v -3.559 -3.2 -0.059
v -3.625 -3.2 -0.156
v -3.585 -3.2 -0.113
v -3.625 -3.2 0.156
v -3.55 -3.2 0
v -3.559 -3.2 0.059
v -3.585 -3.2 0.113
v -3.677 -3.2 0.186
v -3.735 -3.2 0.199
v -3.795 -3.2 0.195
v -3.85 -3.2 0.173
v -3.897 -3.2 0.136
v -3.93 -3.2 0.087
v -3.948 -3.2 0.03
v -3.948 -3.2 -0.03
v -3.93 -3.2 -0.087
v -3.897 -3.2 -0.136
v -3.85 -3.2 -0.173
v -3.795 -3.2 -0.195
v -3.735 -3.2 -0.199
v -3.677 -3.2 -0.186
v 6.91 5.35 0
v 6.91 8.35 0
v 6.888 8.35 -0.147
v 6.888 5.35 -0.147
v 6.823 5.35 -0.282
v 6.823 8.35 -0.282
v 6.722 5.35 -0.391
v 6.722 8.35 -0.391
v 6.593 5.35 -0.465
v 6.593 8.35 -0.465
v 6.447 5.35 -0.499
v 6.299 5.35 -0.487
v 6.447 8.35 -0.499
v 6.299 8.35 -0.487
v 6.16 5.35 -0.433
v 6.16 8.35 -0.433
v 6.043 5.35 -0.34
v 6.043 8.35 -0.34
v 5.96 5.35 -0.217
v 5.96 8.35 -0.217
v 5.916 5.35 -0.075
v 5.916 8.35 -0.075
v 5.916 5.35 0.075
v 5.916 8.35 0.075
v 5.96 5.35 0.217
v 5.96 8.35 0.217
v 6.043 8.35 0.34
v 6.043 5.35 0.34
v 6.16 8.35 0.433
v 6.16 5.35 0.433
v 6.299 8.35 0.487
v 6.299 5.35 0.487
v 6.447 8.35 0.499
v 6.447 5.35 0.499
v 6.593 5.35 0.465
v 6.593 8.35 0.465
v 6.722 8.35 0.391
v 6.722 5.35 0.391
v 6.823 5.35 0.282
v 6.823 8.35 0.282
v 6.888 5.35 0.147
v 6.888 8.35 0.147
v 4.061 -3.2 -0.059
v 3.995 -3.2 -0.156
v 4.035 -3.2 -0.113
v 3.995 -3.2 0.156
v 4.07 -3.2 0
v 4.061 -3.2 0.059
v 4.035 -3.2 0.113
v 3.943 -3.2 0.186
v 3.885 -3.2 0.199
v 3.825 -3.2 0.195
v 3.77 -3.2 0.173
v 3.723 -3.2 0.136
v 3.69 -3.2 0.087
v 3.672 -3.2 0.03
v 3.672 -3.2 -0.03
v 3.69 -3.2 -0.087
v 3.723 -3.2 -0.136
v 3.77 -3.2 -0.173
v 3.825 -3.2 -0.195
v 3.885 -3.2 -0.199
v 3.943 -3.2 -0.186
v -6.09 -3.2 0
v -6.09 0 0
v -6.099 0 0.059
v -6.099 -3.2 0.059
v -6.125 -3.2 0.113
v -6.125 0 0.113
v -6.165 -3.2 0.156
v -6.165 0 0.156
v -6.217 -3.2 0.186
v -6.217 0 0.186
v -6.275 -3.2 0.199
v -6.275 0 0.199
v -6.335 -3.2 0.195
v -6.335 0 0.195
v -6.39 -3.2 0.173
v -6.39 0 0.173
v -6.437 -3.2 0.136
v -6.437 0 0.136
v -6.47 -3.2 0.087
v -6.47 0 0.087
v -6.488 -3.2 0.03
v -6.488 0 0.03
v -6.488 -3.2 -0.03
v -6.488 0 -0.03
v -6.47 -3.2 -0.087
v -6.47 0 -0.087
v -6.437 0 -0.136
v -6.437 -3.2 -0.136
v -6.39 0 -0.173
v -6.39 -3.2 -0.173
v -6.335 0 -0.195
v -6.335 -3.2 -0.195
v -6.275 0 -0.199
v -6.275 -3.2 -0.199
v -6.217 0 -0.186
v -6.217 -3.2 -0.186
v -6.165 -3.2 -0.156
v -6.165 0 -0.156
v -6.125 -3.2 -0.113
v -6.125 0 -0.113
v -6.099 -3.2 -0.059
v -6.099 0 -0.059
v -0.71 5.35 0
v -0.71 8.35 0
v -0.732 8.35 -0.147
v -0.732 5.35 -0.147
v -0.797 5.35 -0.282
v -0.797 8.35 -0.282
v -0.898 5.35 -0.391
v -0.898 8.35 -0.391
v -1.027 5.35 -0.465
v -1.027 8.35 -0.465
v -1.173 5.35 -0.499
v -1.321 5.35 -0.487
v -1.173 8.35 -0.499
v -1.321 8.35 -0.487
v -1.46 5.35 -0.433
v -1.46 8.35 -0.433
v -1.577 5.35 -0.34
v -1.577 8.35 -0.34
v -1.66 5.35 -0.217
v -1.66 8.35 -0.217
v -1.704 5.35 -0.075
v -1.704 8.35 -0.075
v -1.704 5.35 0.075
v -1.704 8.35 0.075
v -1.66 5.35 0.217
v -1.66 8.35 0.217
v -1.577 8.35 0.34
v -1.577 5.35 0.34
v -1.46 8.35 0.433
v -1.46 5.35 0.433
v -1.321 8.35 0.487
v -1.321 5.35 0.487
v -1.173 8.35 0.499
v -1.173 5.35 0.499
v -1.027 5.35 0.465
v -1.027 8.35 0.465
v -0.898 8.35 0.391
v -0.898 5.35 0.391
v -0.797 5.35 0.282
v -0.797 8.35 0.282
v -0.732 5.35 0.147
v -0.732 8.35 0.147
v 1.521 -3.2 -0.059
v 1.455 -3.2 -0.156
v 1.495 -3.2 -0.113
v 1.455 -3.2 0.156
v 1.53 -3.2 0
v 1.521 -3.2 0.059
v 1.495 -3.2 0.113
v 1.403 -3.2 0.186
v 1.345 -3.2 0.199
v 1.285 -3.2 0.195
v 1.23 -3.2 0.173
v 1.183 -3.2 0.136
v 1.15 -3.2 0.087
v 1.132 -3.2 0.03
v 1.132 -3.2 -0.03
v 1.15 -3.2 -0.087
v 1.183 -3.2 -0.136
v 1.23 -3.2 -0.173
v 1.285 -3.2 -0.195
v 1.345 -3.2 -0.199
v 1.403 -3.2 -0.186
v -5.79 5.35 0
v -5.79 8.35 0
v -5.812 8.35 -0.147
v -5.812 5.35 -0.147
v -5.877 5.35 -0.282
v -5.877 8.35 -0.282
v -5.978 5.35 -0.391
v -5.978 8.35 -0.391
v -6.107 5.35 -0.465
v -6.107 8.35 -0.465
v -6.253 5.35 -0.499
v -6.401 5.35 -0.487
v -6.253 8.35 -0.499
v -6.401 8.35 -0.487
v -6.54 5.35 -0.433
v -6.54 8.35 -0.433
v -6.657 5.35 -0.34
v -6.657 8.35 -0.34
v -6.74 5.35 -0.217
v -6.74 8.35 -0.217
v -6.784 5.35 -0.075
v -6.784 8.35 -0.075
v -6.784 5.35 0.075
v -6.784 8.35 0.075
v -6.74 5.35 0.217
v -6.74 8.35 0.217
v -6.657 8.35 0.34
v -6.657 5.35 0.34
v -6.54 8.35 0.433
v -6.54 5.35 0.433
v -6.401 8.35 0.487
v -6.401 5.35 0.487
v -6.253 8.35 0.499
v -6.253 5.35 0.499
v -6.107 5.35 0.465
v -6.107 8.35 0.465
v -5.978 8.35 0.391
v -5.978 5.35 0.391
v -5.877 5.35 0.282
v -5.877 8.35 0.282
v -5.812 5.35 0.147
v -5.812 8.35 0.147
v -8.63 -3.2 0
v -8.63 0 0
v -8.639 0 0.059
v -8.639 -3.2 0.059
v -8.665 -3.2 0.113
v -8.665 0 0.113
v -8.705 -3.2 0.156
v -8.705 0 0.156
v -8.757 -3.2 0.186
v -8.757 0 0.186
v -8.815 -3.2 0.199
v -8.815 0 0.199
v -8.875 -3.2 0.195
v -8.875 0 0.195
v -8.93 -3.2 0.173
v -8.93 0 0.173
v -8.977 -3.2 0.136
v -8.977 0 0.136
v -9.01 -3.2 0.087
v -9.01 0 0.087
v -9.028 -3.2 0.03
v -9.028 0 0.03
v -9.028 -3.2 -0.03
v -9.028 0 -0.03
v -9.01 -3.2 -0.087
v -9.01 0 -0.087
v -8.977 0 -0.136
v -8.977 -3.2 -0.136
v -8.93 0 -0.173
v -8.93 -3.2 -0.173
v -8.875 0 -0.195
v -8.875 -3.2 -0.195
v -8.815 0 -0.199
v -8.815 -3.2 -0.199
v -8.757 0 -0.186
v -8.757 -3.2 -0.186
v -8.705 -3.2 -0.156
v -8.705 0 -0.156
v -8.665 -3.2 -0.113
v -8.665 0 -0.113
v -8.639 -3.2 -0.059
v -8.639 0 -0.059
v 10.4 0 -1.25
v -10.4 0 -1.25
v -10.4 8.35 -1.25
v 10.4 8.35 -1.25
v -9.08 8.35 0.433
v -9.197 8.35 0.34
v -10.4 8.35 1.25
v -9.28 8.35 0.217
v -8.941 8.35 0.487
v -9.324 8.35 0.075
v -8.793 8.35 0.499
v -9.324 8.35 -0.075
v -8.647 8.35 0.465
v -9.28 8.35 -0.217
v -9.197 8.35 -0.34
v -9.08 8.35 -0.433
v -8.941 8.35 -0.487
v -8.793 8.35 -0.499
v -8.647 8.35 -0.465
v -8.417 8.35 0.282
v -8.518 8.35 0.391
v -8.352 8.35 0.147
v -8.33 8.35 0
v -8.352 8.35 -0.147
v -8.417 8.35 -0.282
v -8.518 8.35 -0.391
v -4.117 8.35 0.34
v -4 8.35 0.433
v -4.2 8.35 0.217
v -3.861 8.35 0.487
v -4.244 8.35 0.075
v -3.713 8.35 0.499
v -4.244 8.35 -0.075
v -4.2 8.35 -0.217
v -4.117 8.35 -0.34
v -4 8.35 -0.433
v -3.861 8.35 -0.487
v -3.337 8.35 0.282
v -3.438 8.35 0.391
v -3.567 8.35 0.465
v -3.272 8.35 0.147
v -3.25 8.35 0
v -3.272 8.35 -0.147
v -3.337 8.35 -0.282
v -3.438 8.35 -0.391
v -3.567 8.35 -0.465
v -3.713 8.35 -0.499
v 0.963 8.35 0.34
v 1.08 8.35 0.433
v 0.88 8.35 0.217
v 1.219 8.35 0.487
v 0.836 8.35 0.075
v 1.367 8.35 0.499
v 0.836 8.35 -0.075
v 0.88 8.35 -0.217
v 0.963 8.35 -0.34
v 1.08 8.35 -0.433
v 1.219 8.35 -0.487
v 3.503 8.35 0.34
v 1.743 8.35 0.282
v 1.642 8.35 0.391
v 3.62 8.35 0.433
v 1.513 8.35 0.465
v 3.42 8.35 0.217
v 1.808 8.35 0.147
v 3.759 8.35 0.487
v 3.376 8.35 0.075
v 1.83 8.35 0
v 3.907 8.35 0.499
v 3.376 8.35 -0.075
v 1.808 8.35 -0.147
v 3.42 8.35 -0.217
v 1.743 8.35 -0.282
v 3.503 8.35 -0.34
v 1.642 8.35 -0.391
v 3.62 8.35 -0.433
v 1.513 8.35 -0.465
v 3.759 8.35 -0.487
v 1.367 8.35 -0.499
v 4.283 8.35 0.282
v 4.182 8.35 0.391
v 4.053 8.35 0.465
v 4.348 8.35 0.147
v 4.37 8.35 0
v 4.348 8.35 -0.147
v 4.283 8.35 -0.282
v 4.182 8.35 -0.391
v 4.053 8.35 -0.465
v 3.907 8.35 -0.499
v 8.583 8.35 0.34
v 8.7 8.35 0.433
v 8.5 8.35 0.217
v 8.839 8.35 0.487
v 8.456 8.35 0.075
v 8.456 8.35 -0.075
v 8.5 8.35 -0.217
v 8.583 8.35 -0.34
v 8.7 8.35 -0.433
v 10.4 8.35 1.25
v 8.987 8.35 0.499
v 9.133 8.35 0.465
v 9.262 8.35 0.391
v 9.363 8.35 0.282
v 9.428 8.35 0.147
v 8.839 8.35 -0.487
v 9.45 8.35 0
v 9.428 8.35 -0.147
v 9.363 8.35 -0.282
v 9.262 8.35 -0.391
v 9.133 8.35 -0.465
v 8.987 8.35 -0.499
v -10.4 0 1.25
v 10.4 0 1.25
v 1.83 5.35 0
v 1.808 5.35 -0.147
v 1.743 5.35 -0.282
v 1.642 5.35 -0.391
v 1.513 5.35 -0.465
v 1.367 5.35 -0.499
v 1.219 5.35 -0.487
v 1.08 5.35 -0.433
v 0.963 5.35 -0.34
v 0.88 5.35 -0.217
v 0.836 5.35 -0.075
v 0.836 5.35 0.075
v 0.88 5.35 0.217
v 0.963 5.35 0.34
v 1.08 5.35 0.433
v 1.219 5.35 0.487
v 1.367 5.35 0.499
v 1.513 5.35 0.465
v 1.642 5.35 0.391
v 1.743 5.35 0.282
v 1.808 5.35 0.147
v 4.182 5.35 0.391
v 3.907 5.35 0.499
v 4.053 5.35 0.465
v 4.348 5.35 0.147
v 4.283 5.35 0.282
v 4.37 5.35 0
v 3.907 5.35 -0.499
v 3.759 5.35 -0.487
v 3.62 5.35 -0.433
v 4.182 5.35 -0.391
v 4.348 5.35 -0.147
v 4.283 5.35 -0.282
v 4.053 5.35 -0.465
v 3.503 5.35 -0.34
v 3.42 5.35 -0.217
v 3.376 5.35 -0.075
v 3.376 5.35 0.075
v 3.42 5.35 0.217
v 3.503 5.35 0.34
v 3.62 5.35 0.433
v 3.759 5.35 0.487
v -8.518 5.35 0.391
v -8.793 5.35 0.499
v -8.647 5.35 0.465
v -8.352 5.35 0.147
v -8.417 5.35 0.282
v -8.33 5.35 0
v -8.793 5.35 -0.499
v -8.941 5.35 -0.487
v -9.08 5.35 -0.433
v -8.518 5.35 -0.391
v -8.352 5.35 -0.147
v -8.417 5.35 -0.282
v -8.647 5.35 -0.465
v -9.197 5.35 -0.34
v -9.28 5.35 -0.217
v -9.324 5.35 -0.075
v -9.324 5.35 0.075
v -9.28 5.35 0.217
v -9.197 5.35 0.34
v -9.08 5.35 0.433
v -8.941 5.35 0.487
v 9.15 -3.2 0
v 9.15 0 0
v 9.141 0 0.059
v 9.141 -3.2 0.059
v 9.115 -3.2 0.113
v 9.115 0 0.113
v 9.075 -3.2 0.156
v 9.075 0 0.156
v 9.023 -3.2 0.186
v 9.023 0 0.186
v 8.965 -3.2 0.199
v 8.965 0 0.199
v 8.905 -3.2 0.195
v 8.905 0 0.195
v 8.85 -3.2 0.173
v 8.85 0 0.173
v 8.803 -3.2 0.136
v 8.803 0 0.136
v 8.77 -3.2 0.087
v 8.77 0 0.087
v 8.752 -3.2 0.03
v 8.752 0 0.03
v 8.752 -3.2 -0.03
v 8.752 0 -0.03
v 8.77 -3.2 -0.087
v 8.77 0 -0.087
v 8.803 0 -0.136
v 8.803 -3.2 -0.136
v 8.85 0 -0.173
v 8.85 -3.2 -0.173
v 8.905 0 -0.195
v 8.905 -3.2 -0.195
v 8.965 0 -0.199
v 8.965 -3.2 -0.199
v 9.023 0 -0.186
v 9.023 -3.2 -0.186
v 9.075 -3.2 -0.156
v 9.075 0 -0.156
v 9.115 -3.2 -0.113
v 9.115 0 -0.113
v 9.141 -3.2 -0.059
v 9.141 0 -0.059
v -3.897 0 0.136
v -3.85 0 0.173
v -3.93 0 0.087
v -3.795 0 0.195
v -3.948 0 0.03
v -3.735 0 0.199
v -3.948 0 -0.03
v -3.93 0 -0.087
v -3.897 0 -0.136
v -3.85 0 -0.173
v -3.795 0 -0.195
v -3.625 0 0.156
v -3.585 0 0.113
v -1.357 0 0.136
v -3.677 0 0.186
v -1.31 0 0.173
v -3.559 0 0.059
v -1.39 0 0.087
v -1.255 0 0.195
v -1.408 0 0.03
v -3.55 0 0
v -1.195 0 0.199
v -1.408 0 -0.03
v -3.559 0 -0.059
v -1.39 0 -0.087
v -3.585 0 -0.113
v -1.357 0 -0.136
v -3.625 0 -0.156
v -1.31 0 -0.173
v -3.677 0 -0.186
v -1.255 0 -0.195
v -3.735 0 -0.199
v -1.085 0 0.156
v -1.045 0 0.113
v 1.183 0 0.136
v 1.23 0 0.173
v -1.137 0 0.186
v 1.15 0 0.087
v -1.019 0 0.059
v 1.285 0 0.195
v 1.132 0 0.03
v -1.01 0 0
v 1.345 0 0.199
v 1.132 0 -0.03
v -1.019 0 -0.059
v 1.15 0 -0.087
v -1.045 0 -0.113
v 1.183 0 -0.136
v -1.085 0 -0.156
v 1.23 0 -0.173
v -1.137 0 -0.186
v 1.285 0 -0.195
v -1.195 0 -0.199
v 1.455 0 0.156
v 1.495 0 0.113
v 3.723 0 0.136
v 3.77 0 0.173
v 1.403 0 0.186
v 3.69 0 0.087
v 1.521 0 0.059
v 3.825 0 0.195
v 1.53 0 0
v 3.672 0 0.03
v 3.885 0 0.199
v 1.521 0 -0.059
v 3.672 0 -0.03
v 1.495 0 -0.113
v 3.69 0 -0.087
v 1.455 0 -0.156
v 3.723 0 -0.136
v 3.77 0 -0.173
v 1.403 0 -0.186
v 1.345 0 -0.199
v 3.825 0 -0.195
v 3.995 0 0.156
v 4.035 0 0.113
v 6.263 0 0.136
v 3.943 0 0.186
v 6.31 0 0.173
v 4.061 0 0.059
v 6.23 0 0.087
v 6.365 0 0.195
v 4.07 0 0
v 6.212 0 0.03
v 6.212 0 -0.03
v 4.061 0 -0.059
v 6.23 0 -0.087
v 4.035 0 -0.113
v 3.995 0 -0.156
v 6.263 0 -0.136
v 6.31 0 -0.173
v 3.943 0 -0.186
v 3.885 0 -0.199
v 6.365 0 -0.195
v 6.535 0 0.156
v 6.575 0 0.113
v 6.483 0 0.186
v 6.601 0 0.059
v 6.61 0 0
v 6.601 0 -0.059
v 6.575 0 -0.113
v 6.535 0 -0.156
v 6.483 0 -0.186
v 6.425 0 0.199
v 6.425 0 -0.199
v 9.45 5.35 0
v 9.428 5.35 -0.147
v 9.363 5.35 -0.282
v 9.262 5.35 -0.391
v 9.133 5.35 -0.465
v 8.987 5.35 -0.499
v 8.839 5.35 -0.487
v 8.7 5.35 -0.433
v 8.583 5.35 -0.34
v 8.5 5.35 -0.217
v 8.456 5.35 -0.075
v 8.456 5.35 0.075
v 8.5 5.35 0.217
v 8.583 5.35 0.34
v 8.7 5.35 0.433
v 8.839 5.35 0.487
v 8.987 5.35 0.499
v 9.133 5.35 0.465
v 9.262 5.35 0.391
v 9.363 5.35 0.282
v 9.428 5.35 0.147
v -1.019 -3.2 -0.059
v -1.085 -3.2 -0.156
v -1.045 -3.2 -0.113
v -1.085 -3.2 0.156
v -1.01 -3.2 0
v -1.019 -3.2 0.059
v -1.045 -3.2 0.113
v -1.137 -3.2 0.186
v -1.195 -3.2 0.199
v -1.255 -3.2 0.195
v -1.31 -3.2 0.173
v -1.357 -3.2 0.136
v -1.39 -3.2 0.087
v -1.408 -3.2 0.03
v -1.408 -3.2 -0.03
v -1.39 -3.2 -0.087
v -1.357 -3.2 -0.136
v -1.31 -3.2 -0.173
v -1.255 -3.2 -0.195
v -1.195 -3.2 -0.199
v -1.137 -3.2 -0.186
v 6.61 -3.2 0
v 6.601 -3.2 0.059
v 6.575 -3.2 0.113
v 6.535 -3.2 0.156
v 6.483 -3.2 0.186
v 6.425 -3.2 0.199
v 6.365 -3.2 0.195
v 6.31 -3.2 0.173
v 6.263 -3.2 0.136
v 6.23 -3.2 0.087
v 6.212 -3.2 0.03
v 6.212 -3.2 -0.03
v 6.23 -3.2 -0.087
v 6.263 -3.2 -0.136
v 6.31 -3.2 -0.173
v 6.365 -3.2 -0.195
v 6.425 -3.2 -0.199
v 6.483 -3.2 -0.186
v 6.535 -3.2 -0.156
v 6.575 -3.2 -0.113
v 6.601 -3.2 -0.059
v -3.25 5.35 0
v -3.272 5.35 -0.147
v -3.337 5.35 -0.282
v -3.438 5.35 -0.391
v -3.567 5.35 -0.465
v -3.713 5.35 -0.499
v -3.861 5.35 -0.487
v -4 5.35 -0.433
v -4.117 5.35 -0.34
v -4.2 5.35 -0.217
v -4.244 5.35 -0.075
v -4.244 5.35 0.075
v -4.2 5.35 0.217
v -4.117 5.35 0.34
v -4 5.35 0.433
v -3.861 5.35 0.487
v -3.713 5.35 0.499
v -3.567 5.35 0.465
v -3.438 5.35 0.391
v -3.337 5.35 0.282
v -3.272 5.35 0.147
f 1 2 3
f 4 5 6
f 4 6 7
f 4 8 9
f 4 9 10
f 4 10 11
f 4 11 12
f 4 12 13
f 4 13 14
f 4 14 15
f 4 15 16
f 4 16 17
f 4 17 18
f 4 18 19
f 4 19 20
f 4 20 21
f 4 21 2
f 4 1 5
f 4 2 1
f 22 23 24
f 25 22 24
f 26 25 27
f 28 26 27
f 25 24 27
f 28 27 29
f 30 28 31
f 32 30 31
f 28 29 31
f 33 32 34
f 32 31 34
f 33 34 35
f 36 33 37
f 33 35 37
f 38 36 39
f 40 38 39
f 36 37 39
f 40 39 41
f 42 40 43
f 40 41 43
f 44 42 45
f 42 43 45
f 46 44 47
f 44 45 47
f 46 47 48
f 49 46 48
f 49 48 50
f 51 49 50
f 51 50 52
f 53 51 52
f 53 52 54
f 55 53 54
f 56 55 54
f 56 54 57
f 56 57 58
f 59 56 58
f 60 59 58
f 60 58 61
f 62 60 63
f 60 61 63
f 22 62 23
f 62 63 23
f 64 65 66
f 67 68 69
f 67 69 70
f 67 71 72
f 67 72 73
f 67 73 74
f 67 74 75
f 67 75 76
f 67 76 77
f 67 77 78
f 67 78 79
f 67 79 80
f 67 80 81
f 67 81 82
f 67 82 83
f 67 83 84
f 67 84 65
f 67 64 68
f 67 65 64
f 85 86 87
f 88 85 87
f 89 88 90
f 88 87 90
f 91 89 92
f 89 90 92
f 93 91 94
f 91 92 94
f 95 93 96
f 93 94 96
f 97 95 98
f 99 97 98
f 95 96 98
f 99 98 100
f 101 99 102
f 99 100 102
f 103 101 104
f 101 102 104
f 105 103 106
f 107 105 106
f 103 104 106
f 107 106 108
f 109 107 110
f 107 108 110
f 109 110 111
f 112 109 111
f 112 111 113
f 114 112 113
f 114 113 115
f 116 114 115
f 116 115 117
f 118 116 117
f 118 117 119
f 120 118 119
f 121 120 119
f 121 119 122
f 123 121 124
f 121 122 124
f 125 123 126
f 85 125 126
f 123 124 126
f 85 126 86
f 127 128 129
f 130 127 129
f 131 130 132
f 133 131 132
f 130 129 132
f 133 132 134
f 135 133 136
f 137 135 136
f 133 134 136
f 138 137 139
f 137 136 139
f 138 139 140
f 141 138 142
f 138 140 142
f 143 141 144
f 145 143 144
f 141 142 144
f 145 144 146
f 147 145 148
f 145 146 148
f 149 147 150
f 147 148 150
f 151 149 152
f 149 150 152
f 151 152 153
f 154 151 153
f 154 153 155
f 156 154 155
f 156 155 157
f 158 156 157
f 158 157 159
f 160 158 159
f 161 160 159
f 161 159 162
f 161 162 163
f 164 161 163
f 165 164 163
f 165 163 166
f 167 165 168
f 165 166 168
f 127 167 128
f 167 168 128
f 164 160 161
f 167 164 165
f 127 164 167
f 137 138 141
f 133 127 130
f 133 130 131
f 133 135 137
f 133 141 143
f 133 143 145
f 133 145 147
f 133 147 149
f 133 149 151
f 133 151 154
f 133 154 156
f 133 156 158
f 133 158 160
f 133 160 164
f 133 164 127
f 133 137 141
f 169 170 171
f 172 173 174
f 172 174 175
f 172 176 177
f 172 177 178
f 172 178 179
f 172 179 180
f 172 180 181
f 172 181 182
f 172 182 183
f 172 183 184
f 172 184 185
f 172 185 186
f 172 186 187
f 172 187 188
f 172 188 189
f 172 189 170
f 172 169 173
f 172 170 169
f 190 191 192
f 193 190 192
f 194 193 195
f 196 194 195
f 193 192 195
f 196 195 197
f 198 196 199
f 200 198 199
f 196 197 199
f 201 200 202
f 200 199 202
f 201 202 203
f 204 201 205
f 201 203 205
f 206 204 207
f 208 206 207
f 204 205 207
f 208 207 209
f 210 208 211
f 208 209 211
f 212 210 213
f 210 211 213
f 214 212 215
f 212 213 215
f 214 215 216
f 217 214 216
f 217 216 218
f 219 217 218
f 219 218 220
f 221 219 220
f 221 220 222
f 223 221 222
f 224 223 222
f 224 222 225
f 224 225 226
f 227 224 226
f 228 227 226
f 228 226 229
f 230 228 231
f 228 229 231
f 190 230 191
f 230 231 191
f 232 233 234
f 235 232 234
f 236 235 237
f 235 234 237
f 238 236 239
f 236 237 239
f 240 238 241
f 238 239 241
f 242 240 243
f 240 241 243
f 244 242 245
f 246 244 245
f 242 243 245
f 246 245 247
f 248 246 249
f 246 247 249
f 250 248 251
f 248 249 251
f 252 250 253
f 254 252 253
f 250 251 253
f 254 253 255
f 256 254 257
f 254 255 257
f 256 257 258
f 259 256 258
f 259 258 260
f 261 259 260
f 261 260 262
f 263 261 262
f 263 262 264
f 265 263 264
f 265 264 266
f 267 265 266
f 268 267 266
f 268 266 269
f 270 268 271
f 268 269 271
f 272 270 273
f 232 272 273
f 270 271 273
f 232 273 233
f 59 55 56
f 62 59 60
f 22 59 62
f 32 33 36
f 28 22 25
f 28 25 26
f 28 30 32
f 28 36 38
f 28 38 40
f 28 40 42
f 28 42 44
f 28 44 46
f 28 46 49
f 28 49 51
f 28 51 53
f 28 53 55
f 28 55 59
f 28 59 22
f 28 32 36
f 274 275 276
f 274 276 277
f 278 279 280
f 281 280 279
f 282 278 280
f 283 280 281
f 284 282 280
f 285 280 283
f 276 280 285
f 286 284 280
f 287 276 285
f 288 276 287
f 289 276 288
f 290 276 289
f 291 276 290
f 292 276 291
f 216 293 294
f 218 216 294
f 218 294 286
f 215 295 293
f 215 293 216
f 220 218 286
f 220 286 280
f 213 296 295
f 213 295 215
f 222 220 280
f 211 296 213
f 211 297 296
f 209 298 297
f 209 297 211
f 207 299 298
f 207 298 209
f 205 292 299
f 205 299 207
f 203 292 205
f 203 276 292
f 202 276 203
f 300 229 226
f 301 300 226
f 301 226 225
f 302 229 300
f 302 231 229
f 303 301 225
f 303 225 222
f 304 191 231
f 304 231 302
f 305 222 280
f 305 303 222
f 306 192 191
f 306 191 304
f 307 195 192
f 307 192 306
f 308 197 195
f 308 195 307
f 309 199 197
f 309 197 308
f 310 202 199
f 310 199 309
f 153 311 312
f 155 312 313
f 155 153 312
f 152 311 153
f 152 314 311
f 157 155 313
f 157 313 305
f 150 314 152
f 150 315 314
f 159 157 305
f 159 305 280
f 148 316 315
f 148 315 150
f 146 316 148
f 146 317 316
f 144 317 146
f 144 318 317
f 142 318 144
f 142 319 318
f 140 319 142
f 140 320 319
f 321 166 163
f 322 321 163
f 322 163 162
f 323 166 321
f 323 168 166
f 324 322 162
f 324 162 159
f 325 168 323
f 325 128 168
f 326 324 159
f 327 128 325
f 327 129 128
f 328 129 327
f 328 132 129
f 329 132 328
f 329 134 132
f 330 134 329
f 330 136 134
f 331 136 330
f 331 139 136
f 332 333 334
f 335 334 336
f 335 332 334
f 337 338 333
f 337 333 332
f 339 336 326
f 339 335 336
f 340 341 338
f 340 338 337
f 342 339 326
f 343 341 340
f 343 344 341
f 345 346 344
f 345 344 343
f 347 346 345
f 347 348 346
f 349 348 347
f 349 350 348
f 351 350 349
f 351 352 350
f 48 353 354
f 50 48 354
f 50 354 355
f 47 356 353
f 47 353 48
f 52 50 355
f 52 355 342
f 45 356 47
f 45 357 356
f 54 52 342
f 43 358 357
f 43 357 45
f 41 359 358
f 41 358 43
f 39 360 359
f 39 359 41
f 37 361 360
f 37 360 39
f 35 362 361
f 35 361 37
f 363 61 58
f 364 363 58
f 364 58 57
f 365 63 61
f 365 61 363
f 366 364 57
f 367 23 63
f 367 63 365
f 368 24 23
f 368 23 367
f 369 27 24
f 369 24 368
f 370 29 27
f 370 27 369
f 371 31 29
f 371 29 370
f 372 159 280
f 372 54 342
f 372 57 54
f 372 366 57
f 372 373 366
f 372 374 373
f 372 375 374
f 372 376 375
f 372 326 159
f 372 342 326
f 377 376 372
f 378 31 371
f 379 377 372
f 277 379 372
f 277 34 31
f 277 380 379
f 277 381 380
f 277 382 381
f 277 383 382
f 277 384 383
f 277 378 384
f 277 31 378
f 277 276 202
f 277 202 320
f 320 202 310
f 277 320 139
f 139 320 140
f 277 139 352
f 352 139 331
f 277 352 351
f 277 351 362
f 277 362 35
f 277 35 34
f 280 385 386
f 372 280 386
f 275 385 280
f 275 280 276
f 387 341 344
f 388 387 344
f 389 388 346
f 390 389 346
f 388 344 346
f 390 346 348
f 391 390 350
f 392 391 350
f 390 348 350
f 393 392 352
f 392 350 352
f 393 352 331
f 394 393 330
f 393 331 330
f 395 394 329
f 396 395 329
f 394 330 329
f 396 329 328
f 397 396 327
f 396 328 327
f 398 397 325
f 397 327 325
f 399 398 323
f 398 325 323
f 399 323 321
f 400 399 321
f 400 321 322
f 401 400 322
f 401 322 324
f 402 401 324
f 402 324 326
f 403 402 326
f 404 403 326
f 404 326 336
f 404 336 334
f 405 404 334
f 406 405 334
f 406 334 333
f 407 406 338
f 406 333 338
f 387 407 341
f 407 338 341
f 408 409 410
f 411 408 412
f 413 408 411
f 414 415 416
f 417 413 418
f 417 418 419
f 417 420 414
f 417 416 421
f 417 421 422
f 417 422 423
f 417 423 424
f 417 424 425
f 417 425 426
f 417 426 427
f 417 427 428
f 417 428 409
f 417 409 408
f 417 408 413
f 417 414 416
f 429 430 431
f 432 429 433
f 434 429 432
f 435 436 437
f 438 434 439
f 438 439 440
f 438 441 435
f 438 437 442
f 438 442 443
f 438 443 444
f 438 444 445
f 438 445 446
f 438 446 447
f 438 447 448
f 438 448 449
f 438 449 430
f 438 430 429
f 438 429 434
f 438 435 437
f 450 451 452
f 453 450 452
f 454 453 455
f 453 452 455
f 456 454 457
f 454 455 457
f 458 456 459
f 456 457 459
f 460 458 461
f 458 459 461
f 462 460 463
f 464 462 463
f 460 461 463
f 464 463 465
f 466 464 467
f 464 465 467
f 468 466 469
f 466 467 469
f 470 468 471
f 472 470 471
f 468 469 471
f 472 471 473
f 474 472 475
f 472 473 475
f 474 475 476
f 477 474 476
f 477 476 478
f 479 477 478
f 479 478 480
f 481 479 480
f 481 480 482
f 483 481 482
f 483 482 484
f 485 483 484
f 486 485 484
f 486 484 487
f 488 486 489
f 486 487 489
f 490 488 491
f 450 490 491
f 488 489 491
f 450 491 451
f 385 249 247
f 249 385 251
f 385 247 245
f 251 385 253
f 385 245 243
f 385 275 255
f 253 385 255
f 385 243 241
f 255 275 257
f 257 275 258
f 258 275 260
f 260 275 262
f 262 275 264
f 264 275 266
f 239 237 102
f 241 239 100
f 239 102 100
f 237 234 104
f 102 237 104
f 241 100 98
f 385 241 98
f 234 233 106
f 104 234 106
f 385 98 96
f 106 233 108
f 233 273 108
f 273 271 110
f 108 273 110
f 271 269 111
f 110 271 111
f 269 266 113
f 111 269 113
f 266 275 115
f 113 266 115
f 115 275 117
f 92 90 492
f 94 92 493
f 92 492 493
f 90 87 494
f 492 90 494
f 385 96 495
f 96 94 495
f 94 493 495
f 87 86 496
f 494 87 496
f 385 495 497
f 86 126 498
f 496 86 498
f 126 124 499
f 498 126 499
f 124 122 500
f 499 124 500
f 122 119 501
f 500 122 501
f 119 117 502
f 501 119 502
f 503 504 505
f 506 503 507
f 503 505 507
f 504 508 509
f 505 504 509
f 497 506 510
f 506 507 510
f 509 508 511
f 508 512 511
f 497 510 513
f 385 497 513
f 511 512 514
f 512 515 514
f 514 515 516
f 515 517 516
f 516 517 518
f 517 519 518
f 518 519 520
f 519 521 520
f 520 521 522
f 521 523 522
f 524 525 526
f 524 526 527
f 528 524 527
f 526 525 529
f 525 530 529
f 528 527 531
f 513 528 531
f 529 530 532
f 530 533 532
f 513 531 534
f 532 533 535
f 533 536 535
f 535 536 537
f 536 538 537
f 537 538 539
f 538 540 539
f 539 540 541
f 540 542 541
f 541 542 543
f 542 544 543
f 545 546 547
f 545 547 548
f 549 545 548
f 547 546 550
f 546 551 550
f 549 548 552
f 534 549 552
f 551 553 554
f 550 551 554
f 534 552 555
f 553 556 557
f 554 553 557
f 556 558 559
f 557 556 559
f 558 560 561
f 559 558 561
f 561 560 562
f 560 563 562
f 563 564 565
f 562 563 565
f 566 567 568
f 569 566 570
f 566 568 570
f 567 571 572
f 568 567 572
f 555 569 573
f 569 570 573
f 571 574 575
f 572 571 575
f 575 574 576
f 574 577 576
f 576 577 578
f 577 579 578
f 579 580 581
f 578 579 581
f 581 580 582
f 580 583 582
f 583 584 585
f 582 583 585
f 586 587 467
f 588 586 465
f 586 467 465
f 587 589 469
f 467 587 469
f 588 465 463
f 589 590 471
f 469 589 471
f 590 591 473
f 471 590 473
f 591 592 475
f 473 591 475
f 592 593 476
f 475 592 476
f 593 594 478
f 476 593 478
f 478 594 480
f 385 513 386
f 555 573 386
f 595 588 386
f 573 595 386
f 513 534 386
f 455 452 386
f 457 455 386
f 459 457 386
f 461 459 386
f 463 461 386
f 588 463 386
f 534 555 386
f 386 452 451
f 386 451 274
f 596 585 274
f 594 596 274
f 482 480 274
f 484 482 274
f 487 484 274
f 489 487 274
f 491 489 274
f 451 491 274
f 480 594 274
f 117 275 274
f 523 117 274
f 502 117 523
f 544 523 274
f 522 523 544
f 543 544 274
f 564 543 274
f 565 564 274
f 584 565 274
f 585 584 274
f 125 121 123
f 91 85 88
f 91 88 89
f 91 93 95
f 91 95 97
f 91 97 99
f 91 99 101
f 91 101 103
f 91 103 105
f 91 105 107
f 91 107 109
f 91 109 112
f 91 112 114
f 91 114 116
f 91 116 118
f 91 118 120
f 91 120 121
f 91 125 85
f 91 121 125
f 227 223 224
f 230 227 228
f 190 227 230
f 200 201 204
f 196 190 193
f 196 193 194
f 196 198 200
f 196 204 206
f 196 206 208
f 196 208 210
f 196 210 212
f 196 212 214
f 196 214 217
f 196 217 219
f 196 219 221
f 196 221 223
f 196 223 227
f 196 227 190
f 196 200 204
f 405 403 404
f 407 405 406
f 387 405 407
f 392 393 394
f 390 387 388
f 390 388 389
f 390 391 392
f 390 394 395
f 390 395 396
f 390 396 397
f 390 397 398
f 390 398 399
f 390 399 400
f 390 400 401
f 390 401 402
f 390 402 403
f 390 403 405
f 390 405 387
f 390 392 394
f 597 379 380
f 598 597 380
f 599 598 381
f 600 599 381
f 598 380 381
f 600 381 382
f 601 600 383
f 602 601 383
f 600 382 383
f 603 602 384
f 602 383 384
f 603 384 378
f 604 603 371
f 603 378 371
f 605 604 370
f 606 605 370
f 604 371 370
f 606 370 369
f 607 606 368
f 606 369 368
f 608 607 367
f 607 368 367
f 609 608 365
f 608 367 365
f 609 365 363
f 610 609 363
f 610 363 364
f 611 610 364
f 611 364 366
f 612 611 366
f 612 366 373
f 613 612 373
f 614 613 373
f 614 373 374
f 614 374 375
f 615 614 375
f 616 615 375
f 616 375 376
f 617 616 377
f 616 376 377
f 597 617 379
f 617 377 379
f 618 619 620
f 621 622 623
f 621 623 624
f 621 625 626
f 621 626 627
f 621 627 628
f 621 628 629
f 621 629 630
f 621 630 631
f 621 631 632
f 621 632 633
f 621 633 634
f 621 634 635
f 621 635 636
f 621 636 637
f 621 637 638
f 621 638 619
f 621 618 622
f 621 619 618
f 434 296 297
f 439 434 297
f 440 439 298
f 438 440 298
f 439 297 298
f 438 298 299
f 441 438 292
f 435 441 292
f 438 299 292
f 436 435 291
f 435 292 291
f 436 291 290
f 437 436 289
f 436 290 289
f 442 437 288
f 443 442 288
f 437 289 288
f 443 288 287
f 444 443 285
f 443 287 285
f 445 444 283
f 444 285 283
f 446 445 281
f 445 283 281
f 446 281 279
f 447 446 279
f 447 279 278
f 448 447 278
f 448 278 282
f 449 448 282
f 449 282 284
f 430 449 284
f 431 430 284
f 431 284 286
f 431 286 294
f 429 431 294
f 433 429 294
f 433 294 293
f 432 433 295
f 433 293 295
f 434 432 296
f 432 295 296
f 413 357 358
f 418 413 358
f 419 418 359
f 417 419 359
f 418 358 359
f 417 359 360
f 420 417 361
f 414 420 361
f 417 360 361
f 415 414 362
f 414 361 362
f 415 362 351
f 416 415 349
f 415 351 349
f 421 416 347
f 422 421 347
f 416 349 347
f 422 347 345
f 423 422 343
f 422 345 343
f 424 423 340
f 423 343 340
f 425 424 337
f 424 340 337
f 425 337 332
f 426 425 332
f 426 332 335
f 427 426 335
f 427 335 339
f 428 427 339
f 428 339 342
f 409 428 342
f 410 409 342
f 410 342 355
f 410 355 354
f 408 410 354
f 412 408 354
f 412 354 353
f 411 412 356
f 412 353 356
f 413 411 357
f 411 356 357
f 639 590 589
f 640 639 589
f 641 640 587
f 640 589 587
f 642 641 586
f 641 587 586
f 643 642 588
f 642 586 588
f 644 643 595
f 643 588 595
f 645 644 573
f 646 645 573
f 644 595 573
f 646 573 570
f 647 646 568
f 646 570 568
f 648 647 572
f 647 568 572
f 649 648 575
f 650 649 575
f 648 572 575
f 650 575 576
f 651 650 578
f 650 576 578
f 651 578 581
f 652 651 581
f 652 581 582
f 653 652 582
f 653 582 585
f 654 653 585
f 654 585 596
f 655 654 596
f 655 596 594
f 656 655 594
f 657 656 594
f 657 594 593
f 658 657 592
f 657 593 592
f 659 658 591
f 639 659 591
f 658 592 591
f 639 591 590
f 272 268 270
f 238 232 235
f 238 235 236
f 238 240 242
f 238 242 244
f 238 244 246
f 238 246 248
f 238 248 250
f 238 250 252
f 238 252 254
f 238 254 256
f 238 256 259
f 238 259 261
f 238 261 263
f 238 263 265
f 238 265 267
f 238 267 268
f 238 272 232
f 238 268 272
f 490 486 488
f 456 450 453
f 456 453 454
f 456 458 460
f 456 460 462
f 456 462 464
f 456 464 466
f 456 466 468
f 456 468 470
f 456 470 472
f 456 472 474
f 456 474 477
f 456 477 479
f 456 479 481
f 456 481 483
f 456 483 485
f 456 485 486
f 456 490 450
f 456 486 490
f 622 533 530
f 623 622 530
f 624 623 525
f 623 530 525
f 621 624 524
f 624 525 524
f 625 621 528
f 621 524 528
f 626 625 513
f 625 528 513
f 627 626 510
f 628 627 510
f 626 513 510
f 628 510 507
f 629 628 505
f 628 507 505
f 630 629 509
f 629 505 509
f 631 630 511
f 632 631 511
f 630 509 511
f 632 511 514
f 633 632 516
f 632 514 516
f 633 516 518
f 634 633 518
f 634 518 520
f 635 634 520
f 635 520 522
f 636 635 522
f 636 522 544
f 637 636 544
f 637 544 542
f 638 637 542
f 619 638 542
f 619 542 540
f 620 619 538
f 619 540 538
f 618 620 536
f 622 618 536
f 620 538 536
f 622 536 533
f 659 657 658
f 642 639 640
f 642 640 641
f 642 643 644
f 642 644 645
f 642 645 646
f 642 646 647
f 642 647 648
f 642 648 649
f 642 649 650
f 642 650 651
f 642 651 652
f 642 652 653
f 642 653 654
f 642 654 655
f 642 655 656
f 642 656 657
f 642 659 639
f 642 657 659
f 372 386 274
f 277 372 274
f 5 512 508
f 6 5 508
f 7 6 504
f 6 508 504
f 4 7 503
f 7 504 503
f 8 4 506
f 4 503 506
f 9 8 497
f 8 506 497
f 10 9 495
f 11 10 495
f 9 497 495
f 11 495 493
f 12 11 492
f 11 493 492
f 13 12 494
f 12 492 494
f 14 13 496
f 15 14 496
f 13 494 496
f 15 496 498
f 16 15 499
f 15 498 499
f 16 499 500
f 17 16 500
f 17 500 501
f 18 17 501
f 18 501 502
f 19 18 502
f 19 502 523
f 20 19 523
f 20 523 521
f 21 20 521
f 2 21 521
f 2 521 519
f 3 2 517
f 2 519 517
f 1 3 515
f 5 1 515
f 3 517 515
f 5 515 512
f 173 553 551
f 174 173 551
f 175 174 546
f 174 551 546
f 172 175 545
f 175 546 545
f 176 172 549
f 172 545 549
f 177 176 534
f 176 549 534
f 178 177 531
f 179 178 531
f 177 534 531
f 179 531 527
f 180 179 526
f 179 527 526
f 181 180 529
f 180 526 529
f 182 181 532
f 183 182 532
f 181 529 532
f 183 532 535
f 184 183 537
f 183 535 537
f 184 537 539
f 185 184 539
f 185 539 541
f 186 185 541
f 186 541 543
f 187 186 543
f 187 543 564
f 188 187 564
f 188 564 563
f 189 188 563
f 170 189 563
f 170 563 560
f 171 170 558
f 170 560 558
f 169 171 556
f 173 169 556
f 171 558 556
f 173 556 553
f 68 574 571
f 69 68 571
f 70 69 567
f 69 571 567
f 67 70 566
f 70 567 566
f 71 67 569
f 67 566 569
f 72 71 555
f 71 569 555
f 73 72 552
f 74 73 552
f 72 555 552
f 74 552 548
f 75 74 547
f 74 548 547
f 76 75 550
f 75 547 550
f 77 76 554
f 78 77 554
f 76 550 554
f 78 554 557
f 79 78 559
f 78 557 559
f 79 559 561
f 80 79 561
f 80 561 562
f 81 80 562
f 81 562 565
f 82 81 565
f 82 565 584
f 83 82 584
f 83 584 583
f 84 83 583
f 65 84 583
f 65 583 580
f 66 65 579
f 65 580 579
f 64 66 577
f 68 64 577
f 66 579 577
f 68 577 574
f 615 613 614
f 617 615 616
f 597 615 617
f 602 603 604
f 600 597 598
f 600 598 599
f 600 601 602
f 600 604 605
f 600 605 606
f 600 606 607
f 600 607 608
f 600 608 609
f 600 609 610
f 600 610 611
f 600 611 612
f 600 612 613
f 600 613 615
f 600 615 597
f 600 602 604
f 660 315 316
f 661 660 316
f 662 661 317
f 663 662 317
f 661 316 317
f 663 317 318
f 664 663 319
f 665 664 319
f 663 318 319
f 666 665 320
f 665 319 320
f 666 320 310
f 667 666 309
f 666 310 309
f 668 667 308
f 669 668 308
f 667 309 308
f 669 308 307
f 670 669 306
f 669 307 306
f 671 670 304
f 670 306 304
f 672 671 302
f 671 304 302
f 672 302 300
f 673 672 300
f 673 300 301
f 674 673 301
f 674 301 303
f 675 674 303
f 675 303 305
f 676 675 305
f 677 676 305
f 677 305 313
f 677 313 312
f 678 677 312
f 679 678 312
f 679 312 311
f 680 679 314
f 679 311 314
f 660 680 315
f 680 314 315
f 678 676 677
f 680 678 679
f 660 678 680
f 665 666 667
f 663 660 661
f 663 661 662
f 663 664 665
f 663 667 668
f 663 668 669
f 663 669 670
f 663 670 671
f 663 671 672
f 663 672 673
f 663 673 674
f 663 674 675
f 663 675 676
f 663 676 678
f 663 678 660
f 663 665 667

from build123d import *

# Parameters (mm, degrees)
SKETCH1_W           = 20.8
SKETCH1_H           = 2.5
BOSS_EXTRUDE1_DEPTH = 8.35
SKETCH2_R           = 0.5
CUT_EXTRUDE1_DEPTH  = 3
SKETCH3_R           = 0.2
BOSS_EXTRUDE2_DEPTH = 3.2
LPATTERN1_COUNT     = 8
LPATTERN1_PITCH     = 2.54


with BuildPart() as part:
    # Sketch1 → Boss-Extrude1 (new body)
    with BuildSketch(Plane(origin=(0, 0, 0), x_dir=(1, 0, 0), z_dir=(0, 1, 0))):
        Rectangle(SKETCH1_W, SKETCH1_H)
    extrude(amount=BOSS_EXTRUDE1_DEPTH)

    # Sketch2 → Cut-Extrude1 (cut)
    with BuildSketch(Plane(origin=(0, 8.35, 0), x_dir=(1, 0, 0), z_dir=(0, 1, 0))):
        with Locations((-8.83, 0)):
            Circle(SKETCH2_R)
    cut_extrude1 = extrude(amount=-CUT_EXTRUDE1_DEPTH, mode=Mode.SUBTRACT)

    # Sketch3 → Boss-Extrude2 (add)
    with BuildSketch(Plane.XZ):
        with Locations((-8.83, 0)):
            Circle(SKETCH3_R)
    boss_extrude2 = extrude(amount=BOSS_EXTRUDE2_DEPTH)

    # LPattern1: Cut-Extrude1, Boss-Extrude2 ×8
    with Locations(*[(i * LPATTERN1_PITCH, 0, 0) for i in range(1, LPATTERN1_COUNT)]):
        add(cut_extrude1, mode=Mode.SUBTRACT)
        add(boss_extrude2)


solid = part.part
